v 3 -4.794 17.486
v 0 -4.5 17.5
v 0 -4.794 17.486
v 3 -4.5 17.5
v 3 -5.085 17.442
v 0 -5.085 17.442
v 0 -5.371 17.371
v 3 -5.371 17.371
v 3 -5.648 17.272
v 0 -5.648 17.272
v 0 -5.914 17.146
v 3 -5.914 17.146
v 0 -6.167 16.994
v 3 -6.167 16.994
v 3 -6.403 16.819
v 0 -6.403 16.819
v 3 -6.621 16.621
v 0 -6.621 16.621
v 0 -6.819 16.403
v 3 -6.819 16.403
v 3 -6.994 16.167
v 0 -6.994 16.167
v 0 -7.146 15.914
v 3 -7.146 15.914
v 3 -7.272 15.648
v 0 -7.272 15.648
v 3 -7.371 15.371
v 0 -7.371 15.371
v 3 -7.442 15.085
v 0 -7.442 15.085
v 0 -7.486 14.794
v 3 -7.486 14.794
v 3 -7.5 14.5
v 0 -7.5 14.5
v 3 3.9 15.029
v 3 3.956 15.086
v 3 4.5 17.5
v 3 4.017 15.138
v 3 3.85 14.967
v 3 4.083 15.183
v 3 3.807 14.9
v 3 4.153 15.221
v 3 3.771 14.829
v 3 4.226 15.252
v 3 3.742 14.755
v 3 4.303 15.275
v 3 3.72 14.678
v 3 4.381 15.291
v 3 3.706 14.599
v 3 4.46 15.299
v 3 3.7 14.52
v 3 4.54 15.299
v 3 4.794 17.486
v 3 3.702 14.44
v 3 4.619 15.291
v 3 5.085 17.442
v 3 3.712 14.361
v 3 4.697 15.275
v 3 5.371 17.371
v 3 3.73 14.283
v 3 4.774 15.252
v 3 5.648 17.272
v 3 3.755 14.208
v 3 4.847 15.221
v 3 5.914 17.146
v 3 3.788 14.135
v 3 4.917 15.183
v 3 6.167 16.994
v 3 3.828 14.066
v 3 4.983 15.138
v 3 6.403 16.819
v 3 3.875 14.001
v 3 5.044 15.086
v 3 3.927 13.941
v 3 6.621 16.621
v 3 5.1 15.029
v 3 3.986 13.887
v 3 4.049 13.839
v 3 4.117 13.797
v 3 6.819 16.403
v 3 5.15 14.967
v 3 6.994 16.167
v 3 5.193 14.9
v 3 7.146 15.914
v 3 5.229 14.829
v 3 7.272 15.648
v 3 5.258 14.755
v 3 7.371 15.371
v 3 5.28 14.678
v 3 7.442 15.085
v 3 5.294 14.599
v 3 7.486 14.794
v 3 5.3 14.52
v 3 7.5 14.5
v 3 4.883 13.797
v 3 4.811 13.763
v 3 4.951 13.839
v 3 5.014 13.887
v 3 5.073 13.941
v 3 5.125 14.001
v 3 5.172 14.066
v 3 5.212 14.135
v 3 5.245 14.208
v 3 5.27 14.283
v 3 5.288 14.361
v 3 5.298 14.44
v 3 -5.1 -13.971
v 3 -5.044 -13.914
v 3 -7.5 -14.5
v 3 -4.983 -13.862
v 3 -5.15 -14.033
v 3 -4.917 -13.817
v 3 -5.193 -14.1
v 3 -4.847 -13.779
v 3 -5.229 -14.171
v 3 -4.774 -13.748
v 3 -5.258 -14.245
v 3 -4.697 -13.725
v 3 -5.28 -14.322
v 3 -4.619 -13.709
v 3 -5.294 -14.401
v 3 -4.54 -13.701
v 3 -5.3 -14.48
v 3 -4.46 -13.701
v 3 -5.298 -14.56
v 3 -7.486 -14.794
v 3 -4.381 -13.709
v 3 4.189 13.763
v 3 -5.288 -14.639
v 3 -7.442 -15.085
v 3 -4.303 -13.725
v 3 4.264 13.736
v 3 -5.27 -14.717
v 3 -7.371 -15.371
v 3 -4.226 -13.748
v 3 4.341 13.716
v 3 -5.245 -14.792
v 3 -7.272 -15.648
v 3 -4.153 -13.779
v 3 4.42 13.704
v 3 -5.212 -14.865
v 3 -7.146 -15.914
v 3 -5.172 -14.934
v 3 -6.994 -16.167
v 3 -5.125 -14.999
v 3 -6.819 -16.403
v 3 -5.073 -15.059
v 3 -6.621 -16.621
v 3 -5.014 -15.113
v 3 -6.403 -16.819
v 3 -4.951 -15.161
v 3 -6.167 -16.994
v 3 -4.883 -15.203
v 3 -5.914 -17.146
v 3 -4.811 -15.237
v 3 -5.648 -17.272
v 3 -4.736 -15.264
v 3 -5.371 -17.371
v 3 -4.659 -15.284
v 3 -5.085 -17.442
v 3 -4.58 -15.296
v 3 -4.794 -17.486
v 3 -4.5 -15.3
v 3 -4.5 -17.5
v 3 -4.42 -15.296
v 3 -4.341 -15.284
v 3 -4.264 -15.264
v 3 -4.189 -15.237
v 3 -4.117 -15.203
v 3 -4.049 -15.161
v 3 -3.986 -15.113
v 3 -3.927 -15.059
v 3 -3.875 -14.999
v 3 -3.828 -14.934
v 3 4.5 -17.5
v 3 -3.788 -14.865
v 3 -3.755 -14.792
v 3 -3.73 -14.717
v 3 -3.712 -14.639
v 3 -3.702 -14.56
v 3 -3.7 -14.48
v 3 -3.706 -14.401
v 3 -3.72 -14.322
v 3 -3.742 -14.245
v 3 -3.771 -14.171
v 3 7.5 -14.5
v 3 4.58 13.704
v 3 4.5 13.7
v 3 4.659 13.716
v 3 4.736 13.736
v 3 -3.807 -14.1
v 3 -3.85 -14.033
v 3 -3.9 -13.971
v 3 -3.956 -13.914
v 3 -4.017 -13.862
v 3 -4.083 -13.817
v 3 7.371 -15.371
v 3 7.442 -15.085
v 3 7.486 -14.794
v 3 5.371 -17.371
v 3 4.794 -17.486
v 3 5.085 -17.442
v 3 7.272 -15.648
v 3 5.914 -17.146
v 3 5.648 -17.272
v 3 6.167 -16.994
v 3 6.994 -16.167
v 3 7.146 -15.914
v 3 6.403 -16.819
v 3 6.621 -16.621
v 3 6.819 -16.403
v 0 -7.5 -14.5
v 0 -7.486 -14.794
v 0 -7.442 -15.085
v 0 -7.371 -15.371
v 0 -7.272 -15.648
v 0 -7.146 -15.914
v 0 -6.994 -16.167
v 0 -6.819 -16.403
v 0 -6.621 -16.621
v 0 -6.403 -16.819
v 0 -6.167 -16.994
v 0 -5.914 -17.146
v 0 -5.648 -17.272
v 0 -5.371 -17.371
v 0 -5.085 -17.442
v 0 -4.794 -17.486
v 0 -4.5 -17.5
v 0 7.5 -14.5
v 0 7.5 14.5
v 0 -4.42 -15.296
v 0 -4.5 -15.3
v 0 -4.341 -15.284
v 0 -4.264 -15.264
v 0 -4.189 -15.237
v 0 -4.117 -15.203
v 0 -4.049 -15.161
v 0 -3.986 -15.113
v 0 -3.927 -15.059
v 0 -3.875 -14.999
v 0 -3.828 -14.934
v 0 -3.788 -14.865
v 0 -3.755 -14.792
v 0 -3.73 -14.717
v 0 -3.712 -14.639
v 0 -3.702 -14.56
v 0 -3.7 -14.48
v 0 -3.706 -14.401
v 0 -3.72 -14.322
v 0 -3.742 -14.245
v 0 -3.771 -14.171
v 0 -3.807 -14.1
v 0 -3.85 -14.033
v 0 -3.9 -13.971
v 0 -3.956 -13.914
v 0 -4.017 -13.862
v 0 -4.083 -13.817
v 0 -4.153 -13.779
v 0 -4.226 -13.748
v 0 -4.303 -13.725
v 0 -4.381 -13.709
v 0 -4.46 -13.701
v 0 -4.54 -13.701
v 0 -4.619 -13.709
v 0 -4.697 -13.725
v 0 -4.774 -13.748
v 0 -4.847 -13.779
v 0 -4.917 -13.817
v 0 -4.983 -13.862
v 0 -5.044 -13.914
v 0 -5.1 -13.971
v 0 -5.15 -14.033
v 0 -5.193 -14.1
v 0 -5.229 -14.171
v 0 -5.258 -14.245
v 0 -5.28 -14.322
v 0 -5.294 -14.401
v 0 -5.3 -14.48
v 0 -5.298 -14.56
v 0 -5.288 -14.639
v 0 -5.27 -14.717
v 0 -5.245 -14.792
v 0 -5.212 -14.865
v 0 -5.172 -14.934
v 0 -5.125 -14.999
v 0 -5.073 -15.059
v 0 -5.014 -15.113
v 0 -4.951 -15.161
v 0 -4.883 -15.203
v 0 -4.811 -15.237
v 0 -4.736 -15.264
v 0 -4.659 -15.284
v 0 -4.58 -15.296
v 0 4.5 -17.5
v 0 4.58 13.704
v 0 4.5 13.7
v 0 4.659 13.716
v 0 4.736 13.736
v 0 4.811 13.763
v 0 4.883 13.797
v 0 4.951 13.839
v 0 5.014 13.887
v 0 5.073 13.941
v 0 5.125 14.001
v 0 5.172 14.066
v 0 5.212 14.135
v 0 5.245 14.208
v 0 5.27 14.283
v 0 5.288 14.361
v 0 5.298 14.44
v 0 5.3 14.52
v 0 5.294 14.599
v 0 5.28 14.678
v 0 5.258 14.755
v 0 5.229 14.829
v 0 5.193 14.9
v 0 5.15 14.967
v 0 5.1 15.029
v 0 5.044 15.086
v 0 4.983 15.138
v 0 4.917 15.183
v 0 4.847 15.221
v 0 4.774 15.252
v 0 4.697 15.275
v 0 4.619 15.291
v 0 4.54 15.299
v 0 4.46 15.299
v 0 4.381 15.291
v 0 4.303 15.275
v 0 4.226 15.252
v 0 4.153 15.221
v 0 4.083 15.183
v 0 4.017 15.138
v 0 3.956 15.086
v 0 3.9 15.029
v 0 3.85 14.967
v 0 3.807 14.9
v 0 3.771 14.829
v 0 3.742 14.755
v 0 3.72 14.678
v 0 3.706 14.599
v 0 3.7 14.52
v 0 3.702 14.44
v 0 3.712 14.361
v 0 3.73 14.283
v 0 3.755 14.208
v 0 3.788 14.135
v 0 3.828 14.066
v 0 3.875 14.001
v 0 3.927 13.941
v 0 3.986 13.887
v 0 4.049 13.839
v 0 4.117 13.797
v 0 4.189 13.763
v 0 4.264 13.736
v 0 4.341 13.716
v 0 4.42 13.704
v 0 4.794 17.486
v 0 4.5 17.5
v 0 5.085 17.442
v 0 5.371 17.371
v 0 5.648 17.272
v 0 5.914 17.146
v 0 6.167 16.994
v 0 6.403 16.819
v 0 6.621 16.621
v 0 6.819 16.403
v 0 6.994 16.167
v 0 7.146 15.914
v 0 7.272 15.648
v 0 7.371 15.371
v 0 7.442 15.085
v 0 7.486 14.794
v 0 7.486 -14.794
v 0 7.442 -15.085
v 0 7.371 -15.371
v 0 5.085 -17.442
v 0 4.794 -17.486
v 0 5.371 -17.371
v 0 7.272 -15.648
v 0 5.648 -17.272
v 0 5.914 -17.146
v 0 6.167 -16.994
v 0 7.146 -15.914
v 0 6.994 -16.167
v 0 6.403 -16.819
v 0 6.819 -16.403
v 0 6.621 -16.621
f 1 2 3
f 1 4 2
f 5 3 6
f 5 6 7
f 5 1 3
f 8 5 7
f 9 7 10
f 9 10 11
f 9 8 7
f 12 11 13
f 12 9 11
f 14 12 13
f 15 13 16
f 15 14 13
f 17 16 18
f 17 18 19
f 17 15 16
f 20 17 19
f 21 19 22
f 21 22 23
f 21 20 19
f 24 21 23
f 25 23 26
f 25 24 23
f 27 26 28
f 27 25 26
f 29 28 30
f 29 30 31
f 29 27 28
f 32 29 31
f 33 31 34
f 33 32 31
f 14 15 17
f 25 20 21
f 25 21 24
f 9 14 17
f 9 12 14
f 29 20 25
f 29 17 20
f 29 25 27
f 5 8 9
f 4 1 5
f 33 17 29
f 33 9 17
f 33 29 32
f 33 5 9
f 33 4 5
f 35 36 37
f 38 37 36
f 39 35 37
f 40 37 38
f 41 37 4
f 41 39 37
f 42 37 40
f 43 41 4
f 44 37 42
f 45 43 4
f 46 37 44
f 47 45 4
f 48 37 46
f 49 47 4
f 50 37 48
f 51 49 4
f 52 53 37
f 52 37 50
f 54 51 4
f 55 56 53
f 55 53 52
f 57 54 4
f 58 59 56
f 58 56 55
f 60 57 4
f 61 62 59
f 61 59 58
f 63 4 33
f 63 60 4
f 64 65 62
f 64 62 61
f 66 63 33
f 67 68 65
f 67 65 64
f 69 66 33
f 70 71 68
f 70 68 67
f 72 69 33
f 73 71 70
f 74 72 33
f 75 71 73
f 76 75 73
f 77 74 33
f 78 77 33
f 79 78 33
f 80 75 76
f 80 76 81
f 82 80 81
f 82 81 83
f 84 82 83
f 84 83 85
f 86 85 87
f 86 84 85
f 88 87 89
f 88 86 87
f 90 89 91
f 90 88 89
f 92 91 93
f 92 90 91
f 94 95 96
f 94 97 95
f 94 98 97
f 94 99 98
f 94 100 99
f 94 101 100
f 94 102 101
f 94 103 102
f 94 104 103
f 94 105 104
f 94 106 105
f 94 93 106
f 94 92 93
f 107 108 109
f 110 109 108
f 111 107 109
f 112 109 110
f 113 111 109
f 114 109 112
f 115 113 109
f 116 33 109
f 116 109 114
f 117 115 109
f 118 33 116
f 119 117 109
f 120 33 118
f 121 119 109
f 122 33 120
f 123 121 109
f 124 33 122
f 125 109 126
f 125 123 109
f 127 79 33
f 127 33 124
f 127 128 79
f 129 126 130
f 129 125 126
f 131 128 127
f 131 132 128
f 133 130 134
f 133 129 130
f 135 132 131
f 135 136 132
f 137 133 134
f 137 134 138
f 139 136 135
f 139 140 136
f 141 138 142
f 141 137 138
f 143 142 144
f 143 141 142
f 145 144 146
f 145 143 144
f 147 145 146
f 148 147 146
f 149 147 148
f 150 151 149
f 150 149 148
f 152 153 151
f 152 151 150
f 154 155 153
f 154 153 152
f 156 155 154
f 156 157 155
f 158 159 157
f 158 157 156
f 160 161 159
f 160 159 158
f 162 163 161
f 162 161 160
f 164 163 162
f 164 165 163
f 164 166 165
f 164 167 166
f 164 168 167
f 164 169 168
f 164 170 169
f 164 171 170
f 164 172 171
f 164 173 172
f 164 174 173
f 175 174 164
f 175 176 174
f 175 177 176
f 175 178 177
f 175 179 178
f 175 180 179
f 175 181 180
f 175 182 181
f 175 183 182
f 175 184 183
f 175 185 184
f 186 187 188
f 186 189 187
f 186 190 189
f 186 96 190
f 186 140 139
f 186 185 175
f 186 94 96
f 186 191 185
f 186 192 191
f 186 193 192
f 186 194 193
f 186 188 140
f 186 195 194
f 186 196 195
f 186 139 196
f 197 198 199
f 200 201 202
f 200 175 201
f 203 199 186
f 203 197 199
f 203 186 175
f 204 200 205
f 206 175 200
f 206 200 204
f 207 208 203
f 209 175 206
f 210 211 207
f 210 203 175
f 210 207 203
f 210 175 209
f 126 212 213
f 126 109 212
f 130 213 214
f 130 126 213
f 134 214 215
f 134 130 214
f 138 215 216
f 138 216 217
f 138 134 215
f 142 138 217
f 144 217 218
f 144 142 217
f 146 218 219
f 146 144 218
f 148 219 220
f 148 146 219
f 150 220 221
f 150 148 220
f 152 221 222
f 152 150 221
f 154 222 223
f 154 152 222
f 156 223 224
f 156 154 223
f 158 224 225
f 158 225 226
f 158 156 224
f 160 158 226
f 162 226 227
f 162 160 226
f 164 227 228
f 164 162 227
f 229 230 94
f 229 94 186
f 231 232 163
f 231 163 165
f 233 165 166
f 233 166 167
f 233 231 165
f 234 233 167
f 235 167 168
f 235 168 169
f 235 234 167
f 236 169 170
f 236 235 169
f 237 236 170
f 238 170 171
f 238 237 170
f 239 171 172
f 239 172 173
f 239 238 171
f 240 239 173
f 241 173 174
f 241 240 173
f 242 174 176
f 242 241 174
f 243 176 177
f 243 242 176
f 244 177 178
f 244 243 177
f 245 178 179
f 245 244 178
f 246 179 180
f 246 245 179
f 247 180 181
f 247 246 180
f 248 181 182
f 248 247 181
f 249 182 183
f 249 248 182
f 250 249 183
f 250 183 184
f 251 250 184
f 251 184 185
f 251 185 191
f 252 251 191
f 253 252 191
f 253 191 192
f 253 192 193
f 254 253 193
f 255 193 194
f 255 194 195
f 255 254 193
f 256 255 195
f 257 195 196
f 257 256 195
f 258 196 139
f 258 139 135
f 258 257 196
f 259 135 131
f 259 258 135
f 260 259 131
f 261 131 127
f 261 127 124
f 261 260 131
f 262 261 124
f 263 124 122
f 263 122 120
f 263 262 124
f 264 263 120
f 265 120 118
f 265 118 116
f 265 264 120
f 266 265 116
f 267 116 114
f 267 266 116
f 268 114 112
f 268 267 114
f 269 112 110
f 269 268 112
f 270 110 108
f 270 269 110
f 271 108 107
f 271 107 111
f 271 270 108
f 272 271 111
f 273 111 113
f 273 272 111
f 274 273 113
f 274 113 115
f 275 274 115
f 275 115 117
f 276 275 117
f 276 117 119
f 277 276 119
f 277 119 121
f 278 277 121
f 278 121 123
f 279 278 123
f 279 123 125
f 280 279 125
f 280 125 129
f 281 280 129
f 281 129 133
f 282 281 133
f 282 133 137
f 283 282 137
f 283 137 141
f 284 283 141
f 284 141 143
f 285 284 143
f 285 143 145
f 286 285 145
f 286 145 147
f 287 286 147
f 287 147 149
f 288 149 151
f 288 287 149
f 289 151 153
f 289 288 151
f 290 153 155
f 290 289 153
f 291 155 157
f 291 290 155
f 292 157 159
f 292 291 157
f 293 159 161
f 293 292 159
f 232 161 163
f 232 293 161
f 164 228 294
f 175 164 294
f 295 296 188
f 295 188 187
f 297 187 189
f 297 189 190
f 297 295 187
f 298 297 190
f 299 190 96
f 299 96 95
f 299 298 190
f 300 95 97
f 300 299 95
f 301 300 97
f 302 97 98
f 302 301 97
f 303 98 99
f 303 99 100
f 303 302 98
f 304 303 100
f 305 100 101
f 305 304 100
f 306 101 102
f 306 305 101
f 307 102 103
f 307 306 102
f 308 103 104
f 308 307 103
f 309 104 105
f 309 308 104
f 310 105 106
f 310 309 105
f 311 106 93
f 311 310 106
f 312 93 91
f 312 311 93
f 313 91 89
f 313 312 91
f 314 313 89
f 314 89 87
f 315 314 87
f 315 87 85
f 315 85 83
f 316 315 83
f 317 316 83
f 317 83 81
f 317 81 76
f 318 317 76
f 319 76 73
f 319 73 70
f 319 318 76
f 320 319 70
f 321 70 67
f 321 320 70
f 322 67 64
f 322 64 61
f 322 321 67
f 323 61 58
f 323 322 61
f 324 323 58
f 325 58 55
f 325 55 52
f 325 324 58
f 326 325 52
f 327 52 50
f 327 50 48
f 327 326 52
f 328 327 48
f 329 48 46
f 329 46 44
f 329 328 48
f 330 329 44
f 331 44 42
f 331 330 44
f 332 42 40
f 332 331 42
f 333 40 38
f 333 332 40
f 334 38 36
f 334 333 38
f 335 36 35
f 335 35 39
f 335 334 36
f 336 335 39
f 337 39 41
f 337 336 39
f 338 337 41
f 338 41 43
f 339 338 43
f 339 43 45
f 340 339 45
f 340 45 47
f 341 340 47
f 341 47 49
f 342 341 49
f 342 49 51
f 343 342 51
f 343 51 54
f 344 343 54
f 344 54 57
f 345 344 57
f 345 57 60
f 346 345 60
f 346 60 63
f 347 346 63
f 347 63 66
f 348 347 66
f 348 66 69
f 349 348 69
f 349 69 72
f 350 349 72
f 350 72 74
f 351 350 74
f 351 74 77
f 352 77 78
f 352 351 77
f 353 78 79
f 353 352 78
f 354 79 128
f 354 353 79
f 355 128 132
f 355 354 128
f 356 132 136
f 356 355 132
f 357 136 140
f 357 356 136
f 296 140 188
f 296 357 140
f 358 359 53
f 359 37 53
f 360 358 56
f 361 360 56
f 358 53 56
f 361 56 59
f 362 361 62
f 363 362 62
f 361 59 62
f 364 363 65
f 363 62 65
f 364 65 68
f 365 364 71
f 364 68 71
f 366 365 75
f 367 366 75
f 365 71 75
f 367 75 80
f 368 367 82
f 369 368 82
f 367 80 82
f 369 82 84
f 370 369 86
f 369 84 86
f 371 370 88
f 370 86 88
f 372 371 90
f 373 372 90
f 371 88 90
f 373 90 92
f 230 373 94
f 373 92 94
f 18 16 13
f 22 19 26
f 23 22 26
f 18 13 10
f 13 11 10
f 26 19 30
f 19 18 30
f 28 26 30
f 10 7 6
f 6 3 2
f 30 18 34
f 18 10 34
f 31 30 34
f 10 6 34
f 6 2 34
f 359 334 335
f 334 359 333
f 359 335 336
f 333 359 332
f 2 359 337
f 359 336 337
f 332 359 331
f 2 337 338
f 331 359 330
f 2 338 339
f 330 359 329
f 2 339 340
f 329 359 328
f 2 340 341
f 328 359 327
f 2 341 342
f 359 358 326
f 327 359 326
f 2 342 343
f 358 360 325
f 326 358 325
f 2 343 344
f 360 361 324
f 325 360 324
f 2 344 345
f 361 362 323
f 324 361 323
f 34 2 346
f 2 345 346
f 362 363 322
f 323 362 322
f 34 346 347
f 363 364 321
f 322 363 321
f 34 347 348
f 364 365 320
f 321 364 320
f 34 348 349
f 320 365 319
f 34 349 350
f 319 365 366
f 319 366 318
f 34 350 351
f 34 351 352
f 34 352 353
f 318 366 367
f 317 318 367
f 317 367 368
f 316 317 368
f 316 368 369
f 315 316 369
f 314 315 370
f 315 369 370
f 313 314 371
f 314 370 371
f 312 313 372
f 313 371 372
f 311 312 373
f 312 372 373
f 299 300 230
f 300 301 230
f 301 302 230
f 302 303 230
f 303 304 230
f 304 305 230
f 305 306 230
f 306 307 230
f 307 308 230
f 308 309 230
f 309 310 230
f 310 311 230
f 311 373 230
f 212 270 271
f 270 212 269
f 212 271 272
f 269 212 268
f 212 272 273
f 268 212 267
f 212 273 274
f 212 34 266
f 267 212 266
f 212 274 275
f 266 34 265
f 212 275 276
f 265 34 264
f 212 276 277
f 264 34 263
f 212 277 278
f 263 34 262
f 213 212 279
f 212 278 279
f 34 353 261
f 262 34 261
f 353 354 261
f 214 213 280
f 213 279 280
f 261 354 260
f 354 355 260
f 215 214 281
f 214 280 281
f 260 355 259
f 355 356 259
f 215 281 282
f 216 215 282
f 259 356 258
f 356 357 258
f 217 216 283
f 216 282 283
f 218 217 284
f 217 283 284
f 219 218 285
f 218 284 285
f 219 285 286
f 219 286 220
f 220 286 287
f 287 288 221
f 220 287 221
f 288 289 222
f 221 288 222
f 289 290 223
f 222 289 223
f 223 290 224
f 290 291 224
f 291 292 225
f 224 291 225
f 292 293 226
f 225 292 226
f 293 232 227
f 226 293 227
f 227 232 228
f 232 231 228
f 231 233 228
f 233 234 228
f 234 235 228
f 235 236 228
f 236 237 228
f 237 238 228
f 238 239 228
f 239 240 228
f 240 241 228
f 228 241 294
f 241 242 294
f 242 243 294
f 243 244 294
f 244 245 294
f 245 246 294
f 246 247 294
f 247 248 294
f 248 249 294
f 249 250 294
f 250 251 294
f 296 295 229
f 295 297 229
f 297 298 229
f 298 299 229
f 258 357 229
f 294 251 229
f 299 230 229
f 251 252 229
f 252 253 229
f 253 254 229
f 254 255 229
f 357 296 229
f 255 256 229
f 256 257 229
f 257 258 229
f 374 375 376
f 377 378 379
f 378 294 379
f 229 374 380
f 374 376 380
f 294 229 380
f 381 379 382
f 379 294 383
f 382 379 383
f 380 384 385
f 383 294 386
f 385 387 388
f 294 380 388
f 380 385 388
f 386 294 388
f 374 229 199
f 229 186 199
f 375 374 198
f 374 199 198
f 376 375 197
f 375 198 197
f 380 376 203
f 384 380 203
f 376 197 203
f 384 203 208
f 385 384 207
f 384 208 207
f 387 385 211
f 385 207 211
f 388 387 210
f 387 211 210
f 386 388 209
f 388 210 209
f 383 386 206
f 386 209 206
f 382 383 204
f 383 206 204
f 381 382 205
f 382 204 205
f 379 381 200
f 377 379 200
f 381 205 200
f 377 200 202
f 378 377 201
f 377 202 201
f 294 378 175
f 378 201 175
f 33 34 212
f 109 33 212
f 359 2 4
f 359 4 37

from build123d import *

# Parameters (mm, degrees)
ESBO_O1_W                = 35
ESBO_O1_H                = 15
ESBO_O1_R                = 0.8
RESSALTO_EXTRUS_O1_DEPTH = 3
FILETE1_R                = 3


with BuildPart() as part:
    # Esboço1 → Ressalto-extrusão1 (new body)
    with BuildSketch(Plane(origin=(0, 0, 0), x_dir=(0, 0, -1), z_dir=(1, 0, 0))):
        Rectangle(ESBO_O1_W, ESBO_O1_H)
        with Locations((-14.5, 4.5)):
            Circle(ESBO_O1_R, mode=Mode.SUBTRACT)
        with Locations((14.5, -4.5)):
            Circle(ESBO_O1_R, mode=Mode.SUBTRACT)
    extrude(amount=RESSALTO_EXTRUS_O1_DEPTH)

    # Filete1
    filete1_edges = [part.edges().sort_by_distance(p)[0] for p in [
        (1.5, -7.5, -17.5),
        (1.5, -7.5, 17.5),
        (1.5, 7.5, 17.5),
        (1.5, 7.5, -17.5),
    ]]
    fillet(filete1_edges, radius=FILETE1_R)


solid = part.part
